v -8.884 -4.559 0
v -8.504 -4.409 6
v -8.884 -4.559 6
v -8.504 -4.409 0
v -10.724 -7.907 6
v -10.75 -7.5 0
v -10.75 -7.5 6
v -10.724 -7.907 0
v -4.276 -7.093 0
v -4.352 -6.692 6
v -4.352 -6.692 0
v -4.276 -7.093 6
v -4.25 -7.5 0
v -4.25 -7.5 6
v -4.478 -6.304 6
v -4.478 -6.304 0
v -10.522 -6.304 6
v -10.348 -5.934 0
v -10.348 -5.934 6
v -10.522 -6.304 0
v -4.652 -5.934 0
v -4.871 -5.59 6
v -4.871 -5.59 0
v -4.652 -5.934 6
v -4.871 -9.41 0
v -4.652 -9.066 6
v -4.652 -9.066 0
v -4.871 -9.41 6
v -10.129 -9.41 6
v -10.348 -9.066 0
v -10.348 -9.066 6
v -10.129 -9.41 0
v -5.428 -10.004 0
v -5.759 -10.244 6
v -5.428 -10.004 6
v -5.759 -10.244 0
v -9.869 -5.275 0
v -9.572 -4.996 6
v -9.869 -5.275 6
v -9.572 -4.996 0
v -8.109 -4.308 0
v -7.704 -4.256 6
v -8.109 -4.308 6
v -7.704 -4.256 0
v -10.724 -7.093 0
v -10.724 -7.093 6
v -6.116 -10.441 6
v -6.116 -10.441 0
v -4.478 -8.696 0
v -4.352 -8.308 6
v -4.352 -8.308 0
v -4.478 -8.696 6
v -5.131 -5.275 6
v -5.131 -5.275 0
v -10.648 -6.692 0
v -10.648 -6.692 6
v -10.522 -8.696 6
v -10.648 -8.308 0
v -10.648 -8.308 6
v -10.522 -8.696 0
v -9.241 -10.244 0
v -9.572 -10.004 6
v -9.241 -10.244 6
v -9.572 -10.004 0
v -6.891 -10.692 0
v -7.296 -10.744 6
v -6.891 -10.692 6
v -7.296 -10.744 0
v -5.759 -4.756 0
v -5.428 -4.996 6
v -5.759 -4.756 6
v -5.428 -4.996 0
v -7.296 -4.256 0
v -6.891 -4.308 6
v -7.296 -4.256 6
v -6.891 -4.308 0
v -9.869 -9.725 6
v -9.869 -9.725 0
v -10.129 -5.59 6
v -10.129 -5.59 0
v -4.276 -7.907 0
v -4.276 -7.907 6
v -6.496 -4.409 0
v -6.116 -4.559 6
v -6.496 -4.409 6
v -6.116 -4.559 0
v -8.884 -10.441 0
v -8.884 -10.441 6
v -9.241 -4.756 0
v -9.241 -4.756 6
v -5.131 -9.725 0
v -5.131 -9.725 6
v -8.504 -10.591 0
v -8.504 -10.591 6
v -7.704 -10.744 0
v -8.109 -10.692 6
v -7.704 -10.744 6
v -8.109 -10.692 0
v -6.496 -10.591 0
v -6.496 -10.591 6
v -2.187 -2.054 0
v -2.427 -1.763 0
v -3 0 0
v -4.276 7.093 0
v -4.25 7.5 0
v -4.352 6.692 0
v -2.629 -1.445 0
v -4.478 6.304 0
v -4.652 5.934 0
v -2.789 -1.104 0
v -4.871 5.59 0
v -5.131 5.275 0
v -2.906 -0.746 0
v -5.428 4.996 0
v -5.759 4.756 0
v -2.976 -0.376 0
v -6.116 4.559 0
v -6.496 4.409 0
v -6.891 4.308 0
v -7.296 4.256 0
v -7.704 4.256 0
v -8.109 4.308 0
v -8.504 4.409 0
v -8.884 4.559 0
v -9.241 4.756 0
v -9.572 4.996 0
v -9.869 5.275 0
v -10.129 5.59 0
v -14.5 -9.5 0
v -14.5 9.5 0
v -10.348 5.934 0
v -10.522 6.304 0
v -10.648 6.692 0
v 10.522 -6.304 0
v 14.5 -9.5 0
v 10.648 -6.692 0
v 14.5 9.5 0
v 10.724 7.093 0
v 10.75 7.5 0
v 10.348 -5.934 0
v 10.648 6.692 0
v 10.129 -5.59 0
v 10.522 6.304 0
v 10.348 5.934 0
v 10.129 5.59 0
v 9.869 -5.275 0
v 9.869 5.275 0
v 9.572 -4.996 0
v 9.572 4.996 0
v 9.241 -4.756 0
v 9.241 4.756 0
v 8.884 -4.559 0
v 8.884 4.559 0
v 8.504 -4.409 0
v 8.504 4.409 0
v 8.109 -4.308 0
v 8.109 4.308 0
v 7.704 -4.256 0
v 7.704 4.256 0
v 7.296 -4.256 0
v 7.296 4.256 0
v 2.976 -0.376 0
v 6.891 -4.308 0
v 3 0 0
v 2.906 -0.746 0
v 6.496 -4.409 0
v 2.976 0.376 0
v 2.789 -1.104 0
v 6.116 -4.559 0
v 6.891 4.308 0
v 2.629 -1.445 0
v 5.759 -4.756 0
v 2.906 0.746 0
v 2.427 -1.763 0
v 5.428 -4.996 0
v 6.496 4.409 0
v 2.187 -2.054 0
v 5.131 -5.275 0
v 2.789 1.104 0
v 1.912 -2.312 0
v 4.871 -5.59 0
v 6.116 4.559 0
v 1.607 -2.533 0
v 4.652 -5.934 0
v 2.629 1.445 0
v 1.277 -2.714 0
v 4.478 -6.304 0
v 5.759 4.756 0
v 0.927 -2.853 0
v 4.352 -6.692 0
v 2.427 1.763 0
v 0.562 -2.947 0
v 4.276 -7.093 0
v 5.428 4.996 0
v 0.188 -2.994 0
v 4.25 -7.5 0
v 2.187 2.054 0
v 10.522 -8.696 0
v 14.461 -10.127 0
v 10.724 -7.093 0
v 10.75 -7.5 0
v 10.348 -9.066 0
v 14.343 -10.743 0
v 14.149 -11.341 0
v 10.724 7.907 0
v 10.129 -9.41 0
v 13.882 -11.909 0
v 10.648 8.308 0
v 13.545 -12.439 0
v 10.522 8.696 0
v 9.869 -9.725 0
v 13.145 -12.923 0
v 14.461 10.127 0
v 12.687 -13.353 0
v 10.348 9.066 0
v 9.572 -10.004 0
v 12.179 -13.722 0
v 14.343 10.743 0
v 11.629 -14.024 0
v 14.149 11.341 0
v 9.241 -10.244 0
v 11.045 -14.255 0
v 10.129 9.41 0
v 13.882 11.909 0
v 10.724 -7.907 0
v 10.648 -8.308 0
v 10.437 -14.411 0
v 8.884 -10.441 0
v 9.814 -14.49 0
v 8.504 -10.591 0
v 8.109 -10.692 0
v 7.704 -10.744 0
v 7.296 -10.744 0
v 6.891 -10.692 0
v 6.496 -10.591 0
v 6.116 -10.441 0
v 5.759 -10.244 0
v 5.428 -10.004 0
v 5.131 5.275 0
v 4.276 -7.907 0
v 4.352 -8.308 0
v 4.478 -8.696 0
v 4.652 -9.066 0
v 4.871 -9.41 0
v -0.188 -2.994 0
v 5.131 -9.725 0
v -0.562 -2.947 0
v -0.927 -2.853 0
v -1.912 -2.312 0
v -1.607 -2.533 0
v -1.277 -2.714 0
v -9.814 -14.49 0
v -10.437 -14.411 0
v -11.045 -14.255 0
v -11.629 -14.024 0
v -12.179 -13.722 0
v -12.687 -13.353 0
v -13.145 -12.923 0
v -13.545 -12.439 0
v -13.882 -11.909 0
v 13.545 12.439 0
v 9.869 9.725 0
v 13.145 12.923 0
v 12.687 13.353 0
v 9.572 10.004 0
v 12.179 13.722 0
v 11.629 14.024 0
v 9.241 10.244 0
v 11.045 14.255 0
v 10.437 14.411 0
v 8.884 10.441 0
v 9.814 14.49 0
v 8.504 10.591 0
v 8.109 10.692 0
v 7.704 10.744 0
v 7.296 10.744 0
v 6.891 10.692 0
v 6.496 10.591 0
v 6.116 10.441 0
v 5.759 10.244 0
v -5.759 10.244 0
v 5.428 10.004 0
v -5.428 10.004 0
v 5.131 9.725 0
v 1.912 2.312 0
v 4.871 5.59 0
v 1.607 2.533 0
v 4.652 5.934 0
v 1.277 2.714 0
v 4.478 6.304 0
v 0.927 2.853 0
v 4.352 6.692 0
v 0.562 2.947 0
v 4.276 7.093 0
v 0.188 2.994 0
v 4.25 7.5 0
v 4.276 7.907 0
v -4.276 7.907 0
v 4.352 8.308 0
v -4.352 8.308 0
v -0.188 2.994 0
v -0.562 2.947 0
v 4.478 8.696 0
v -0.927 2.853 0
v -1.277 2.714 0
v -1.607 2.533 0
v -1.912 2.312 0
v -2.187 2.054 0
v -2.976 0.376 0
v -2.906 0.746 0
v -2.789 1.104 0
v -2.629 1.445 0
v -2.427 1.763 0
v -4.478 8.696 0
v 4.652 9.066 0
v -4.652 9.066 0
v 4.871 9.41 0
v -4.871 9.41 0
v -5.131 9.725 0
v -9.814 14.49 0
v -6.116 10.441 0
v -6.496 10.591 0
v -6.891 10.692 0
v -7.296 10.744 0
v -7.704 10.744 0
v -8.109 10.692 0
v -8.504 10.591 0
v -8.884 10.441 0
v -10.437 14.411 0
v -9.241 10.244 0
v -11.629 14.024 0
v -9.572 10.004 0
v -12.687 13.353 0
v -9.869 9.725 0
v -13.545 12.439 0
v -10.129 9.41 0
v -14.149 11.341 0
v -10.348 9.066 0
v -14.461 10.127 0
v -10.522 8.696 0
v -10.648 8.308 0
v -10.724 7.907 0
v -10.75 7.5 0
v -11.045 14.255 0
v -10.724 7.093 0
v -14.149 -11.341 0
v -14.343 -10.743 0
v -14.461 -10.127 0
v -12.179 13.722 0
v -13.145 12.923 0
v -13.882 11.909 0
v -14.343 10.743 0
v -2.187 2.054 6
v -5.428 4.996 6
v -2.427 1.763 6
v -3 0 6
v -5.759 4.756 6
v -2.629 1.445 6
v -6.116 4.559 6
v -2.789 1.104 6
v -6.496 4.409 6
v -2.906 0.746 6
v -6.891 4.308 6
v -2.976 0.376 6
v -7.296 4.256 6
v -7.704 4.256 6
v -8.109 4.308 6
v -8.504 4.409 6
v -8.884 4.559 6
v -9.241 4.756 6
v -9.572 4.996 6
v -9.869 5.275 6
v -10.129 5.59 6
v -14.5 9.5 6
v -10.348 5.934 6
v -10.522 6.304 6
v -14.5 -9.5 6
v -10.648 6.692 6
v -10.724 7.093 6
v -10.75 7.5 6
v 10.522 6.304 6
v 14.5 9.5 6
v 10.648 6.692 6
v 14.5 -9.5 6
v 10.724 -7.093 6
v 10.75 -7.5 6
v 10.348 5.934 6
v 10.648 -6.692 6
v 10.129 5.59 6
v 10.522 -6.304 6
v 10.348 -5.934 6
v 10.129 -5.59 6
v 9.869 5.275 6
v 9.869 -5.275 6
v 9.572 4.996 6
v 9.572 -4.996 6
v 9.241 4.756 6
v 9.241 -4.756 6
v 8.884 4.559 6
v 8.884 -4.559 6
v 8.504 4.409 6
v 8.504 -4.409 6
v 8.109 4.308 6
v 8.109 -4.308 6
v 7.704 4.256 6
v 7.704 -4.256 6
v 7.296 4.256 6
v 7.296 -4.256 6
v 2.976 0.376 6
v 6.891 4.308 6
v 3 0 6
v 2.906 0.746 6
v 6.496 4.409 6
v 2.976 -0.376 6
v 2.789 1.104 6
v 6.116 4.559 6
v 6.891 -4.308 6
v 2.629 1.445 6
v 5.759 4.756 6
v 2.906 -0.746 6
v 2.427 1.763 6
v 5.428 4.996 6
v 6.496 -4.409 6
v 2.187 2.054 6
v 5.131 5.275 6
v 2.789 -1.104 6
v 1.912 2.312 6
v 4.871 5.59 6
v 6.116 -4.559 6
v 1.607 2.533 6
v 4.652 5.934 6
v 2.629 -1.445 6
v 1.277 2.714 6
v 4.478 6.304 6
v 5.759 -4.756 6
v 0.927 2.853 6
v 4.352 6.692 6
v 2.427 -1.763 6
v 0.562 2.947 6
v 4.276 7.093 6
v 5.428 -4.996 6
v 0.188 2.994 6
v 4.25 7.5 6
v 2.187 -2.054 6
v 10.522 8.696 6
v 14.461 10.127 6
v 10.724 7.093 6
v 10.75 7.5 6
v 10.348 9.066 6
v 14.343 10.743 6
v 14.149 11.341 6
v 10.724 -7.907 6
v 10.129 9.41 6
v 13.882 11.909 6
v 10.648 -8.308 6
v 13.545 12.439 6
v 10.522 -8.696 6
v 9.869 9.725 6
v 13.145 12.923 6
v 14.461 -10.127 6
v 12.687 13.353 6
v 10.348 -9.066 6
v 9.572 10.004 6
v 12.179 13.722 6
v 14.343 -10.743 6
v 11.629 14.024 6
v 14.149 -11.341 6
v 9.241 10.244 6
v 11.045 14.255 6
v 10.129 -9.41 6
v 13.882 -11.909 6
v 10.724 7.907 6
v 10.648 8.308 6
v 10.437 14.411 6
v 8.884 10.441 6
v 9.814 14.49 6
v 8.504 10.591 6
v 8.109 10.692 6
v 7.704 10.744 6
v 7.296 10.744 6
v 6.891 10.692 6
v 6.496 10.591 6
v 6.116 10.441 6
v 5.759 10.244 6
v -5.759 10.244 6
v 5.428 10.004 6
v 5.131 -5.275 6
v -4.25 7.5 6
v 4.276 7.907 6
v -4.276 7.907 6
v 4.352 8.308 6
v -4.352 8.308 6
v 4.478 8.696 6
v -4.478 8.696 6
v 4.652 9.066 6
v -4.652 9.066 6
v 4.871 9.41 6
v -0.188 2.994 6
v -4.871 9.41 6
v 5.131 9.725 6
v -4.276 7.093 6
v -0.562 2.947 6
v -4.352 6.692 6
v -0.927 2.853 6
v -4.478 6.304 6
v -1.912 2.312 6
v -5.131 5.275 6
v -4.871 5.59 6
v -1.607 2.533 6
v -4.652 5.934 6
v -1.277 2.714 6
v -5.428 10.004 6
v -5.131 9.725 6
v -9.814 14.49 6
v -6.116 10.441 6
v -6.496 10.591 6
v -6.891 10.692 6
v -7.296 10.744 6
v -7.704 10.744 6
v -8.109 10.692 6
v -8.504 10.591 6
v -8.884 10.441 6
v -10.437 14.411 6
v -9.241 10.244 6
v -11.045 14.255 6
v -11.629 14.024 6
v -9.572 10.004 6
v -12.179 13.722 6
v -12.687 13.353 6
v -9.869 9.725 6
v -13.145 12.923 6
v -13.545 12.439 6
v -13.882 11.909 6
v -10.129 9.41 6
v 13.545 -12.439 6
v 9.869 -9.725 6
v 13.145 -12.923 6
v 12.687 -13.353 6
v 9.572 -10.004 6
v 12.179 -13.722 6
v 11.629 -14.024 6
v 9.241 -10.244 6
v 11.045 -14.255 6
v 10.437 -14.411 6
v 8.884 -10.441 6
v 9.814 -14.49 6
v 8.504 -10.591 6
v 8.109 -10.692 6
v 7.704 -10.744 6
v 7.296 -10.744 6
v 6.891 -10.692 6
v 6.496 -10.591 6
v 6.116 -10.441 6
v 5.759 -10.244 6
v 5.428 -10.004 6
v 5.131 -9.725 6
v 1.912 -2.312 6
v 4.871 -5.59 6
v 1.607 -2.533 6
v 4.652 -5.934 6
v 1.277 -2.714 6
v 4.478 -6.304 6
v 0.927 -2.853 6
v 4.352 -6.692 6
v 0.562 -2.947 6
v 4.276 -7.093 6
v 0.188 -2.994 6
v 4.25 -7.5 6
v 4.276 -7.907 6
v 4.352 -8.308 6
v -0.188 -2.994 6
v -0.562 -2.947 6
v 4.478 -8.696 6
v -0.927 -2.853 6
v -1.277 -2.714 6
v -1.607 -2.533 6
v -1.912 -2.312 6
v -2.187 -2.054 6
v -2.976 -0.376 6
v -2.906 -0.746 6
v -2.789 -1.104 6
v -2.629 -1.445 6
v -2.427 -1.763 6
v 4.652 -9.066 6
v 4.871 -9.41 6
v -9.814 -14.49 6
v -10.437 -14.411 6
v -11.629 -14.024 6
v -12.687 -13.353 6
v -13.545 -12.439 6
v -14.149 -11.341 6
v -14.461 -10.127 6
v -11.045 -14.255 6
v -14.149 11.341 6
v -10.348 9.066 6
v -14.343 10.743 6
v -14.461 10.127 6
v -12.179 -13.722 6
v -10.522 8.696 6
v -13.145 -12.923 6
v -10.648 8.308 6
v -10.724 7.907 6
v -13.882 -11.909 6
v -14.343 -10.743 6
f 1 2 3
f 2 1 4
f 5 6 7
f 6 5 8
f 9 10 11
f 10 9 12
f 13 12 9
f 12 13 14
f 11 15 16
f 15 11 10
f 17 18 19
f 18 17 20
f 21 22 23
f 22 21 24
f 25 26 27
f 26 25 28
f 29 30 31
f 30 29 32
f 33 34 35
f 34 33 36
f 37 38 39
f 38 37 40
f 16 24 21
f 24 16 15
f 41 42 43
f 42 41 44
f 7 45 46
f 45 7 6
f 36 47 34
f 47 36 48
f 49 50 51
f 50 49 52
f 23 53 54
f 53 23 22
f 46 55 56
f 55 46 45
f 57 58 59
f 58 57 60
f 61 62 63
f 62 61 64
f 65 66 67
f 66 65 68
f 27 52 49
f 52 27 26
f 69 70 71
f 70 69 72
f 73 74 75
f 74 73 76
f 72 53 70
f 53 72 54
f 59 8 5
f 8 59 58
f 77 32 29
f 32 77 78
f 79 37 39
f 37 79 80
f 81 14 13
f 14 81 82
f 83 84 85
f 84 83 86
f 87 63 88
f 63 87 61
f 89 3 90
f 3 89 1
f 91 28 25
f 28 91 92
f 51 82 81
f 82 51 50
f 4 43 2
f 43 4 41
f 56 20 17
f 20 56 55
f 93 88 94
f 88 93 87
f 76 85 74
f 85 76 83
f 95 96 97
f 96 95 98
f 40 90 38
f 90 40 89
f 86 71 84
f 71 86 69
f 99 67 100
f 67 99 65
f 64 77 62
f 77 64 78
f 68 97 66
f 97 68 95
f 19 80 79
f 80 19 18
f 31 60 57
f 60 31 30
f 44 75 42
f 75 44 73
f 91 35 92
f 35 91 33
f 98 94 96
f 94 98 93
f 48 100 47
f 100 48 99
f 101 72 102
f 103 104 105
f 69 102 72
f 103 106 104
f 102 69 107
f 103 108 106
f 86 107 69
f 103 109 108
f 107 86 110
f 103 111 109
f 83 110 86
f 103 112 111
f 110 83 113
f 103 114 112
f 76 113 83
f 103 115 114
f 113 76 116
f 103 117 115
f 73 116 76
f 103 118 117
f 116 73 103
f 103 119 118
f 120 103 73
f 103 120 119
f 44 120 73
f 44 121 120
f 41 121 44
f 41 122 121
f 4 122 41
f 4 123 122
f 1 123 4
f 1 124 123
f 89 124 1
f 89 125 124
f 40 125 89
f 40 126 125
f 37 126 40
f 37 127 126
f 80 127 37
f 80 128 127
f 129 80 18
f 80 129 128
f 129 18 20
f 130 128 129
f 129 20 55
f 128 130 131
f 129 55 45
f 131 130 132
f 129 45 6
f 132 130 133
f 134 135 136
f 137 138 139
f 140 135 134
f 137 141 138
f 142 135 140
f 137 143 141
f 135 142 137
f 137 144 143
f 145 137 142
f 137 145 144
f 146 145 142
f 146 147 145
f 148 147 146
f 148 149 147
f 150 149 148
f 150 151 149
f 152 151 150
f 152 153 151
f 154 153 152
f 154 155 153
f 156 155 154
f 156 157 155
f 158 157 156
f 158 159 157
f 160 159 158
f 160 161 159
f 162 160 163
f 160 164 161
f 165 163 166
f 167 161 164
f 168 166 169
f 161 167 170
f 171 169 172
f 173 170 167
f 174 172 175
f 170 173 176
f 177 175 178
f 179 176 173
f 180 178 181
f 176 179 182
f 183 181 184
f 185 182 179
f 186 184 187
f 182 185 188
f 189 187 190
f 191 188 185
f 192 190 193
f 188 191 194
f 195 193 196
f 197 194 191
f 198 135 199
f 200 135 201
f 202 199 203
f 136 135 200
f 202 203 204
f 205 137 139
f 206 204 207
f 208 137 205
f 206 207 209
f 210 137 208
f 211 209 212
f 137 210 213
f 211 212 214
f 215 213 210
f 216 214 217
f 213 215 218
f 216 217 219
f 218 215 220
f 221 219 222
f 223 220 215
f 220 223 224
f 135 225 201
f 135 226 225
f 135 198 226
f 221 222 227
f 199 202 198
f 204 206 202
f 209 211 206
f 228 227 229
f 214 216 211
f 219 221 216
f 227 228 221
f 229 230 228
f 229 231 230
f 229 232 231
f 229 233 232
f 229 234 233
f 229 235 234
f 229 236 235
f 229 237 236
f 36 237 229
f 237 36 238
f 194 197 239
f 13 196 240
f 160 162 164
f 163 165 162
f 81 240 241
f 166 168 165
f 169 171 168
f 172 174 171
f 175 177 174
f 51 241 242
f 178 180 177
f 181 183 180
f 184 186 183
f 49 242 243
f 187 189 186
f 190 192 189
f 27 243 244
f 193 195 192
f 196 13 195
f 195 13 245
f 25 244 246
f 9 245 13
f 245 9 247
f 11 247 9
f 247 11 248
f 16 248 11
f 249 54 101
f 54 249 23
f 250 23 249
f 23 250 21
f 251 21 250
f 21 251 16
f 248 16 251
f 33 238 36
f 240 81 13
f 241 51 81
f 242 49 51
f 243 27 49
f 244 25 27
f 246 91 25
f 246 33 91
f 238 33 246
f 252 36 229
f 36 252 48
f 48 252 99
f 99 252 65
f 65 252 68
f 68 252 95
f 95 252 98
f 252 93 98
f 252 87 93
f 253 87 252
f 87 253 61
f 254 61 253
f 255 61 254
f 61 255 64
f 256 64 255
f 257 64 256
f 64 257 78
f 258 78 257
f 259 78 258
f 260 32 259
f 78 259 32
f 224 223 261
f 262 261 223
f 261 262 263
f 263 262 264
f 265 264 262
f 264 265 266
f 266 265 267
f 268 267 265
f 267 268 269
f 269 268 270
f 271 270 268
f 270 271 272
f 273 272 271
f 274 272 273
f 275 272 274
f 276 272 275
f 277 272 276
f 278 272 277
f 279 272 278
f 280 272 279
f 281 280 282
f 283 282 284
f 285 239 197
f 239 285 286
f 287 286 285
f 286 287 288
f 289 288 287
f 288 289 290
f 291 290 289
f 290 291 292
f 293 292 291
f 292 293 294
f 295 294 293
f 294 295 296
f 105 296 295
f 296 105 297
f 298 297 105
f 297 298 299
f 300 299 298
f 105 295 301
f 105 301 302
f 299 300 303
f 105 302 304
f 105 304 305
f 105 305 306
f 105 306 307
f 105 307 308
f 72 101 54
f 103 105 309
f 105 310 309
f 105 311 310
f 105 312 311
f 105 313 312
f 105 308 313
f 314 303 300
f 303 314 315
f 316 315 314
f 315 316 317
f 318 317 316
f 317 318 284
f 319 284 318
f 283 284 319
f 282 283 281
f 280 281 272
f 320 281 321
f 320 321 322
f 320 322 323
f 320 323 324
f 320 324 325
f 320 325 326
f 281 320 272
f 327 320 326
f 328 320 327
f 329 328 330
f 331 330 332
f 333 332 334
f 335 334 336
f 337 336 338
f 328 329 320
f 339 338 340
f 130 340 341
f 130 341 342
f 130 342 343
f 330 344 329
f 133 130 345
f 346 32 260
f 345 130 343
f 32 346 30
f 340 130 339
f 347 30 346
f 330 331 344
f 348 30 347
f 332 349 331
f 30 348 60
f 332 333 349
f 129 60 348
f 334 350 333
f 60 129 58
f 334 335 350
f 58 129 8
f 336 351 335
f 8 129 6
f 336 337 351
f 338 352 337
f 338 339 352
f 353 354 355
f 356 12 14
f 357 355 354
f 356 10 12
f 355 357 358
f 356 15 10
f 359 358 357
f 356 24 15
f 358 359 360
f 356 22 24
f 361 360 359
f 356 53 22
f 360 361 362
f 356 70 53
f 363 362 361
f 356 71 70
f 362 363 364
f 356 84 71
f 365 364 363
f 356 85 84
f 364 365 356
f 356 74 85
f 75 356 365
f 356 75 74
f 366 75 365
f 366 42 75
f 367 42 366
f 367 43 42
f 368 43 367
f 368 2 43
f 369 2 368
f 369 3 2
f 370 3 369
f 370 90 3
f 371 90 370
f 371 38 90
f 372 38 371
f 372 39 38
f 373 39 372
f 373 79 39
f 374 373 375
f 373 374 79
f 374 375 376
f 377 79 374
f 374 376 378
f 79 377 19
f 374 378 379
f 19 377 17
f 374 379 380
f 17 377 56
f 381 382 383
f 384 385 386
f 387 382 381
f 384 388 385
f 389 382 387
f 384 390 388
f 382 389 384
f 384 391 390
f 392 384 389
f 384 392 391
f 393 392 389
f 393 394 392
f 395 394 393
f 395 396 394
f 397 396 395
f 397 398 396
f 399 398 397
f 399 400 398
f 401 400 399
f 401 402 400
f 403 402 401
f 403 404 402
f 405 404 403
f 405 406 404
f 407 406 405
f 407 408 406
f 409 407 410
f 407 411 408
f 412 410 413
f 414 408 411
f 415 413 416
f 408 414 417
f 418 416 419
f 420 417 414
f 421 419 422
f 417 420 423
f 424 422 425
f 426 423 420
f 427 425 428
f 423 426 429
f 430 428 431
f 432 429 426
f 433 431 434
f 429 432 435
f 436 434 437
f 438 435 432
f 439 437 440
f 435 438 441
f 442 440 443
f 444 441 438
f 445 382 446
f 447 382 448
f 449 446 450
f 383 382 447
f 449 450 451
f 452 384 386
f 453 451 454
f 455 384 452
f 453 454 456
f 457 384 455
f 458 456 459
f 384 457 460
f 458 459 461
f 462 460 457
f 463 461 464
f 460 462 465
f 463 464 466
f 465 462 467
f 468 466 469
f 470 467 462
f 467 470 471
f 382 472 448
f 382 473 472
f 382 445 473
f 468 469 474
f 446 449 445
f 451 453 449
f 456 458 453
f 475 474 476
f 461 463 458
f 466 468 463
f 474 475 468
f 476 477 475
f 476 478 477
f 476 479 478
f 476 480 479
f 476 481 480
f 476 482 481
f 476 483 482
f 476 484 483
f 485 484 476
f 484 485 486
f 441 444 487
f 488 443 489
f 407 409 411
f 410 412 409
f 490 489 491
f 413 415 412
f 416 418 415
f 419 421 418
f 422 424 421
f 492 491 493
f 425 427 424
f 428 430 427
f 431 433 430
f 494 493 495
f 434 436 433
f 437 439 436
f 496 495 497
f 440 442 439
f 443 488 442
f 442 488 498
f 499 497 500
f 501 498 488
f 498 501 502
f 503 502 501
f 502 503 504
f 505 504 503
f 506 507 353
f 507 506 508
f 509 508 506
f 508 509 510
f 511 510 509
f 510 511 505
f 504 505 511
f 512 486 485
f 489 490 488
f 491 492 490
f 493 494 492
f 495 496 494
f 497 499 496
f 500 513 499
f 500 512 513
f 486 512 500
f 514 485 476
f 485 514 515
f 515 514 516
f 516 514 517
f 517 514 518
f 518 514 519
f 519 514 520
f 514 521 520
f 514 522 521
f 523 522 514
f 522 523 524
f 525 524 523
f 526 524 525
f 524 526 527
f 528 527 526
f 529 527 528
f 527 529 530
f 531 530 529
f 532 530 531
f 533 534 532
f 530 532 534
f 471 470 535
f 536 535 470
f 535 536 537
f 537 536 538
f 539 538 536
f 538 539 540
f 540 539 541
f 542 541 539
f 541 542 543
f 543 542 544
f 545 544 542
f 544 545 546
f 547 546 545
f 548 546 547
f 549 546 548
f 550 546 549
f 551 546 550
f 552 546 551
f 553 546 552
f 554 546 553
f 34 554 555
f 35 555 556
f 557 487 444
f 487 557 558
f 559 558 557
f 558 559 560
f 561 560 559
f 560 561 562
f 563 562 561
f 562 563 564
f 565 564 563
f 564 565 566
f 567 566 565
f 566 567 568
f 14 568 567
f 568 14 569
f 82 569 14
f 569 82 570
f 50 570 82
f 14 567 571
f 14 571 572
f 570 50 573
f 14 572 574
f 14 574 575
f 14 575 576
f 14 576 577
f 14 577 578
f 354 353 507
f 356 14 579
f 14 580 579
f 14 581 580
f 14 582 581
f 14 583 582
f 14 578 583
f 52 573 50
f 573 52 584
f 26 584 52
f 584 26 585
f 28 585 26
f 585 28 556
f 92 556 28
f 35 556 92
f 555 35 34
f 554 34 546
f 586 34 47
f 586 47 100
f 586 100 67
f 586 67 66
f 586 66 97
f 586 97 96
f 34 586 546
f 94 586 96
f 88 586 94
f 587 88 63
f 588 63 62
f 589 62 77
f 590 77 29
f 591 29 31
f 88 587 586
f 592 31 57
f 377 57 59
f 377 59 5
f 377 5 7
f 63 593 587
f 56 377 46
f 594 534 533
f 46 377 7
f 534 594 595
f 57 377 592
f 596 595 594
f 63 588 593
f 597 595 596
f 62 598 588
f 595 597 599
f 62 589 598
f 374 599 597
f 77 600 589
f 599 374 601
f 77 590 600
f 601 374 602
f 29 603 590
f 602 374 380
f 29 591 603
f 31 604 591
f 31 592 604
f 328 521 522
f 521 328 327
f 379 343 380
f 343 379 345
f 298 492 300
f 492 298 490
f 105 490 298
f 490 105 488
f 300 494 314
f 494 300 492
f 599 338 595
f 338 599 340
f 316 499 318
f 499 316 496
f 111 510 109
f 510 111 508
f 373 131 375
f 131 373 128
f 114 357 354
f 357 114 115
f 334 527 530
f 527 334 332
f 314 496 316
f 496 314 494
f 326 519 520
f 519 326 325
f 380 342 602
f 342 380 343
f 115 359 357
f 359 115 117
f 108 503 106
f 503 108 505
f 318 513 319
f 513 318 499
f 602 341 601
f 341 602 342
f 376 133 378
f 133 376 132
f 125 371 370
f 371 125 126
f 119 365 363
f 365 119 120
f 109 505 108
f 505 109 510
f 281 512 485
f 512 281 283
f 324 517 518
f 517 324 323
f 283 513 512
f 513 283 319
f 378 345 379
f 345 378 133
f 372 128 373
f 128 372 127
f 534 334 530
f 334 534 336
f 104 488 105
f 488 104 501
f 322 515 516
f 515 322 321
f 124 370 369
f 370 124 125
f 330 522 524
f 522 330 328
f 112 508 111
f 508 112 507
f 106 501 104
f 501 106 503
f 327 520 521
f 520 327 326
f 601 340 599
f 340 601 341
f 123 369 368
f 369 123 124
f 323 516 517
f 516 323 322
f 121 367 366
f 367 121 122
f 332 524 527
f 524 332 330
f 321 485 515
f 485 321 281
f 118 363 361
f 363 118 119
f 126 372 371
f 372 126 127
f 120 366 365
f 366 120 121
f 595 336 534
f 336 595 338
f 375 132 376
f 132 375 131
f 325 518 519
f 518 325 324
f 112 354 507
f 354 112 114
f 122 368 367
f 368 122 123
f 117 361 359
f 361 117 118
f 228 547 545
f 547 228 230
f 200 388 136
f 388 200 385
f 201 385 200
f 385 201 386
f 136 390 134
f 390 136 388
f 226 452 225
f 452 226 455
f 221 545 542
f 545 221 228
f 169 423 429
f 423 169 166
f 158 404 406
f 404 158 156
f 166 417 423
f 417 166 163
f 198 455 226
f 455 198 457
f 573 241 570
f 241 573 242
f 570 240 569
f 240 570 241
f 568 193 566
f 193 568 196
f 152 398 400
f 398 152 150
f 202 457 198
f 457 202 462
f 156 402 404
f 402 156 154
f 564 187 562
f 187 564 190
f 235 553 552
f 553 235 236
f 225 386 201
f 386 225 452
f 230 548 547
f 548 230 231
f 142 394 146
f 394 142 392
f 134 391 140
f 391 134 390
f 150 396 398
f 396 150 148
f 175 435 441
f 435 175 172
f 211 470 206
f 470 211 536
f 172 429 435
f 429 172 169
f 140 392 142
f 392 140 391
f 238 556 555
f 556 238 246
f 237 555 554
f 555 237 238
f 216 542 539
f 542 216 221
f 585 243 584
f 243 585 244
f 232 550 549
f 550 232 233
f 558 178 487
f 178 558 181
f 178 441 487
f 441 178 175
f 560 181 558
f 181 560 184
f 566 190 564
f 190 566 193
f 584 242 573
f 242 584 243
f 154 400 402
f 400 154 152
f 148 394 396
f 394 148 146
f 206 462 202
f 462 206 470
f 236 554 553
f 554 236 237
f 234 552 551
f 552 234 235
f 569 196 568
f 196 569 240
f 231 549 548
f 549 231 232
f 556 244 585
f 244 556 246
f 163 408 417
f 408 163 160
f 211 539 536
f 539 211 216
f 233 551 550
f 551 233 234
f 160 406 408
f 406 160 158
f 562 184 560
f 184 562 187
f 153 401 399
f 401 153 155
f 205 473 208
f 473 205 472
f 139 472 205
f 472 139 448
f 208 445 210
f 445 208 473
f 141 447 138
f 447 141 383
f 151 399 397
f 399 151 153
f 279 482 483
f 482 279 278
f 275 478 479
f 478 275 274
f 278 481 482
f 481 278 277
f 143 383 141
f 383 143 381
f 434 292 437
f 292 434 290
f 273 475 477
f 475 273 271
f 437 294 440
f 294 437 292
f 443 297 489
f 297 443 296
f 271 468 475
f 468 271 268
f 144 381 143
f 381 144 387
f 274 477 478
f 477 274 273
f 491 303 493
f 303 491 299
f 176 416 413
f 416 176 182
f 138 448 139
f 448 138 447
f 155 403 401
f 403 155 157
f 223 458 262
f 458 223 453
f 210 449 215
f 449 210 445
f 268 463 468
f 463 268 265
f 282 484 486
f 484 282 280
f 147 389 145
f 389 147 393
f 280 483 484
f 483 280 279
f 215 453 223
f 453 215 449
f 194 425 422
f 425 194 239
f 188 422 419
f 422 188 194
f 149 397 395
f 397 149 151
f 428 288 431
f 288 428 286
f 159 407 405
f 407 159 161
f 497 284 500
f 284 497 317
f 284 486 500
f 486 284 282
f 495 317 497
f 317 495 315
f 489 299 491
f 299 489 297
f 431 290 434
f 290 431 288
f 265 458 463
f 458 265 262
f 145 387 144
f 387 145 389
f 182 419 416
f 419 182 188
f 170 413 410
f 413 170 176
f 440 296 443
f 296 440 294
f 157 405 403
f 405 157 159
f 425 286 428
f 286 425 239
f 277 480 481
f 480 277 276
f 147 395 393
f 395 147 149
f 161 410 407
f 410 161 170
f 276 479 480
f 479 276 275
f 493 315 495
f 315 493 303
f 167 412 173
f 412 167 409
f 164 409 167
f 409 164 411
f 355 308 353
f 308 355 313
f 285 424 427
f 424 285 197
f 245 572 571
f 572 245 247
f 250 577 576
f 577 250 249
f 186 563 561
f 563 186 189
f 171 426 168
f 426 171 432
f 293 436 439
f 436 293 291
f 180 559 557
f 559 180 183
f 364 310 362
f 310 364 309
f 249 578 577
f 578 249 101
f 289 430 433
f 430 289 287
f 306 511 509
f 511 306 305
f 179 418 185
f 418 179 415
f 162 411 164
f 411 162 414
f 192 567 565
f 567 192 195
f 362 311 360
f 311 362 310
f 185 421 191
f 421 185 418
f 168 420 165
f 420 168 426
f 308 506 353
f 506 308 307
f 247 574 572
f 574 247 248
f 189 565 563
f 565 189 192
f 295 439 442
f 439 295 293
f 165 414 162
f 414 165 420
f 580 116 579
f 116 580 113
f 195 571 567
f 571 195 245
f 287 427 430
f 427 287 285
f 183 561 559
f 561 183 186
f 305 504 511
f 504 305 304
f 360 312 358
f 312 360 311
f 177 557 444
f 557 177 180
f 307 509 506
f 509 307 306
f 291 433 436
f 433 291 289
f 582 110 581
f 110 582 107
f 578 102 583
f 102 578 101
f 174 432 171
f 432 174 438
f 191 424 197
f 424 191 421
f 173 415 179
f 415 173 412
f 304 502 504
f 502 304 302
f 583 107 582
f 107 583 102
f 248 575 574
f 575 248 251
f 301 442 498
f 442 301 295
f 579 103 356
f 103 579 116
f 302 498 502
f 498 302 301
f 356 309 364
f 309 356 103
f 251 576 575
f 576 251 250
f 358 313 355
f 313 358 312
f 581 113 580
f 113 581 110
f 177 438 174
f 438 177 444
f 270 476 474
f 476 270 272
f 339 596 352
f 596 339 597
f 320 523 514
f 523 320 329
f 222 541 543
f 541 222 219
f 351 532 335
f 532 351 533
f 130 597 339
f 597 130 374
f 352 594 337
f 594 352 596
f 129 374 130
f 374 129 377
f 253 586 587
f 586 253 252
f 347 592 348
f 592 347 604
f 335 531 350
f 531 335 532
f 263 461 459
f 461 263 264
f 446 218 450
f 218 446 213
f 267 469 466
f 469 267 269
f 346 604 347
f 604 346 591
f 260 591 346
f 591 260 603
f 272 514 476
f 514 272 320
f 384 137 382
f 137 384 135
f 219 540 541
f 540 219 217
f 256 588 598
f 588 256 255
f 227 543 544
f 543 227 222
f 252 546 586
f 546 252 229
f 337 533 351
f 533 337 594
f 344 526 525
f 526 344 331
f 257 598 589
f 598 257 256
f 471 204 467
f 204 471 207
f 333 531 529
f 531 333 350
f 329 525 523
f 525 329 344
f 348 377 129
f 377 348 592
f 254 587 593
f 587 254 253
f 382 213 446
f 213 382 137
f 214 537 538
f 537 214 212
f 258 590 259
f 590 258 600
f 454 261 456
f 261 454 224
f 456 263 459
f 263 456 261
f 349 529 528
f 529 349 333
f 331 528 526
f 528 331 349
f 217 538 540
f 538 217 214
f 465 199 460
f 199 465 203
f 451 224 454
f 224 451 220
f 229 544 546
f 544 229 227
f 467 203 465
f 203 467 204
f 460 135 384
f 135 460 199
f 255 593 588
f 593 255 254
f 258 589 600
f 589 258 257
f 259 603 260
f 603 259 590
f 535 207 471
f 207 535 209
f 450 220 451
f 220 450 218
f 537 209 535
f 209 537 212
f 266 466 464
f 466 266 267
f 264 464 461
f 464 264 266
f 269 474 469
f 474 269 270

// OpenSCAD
$fn = 50;

difference() {
	union() {
		hull() {
			translate(v = [-9.5, 9.5, 0]) {
				cylinder(h = 6, r = 5);
			}
			translate(v = [9.5, 9.5, 0]) {
				cylinder(h = 6, r = 5);
			}
			translate(v = [-9.5, -9.5, 0]) {
				cylinder(h = 6, r = 5);
			}
			translate(v = [9.5, -9.5, 0]) {
				cylinder(h = 6, r = 5);
			}
		}
	}
	union() {
		translate(v = [-7.5, -7.5, 0]) {
			cylinder(h = 6, r = 3.25);
		}
		translate(v = [-7.5, 7.5, 0]) {
			cylinder(h = 6, r = 3.25);
		}
		translate(v = [7.5, -7.5, 0]) {
			cylinder(h = 6, r = 3.25);
		}
		translate(v = [7.5, 7.5, 0]) {
			cylinder(h = 6, r = 3.25);
		}
		cylinder(h = 6, r = 3.0);
	}
}
